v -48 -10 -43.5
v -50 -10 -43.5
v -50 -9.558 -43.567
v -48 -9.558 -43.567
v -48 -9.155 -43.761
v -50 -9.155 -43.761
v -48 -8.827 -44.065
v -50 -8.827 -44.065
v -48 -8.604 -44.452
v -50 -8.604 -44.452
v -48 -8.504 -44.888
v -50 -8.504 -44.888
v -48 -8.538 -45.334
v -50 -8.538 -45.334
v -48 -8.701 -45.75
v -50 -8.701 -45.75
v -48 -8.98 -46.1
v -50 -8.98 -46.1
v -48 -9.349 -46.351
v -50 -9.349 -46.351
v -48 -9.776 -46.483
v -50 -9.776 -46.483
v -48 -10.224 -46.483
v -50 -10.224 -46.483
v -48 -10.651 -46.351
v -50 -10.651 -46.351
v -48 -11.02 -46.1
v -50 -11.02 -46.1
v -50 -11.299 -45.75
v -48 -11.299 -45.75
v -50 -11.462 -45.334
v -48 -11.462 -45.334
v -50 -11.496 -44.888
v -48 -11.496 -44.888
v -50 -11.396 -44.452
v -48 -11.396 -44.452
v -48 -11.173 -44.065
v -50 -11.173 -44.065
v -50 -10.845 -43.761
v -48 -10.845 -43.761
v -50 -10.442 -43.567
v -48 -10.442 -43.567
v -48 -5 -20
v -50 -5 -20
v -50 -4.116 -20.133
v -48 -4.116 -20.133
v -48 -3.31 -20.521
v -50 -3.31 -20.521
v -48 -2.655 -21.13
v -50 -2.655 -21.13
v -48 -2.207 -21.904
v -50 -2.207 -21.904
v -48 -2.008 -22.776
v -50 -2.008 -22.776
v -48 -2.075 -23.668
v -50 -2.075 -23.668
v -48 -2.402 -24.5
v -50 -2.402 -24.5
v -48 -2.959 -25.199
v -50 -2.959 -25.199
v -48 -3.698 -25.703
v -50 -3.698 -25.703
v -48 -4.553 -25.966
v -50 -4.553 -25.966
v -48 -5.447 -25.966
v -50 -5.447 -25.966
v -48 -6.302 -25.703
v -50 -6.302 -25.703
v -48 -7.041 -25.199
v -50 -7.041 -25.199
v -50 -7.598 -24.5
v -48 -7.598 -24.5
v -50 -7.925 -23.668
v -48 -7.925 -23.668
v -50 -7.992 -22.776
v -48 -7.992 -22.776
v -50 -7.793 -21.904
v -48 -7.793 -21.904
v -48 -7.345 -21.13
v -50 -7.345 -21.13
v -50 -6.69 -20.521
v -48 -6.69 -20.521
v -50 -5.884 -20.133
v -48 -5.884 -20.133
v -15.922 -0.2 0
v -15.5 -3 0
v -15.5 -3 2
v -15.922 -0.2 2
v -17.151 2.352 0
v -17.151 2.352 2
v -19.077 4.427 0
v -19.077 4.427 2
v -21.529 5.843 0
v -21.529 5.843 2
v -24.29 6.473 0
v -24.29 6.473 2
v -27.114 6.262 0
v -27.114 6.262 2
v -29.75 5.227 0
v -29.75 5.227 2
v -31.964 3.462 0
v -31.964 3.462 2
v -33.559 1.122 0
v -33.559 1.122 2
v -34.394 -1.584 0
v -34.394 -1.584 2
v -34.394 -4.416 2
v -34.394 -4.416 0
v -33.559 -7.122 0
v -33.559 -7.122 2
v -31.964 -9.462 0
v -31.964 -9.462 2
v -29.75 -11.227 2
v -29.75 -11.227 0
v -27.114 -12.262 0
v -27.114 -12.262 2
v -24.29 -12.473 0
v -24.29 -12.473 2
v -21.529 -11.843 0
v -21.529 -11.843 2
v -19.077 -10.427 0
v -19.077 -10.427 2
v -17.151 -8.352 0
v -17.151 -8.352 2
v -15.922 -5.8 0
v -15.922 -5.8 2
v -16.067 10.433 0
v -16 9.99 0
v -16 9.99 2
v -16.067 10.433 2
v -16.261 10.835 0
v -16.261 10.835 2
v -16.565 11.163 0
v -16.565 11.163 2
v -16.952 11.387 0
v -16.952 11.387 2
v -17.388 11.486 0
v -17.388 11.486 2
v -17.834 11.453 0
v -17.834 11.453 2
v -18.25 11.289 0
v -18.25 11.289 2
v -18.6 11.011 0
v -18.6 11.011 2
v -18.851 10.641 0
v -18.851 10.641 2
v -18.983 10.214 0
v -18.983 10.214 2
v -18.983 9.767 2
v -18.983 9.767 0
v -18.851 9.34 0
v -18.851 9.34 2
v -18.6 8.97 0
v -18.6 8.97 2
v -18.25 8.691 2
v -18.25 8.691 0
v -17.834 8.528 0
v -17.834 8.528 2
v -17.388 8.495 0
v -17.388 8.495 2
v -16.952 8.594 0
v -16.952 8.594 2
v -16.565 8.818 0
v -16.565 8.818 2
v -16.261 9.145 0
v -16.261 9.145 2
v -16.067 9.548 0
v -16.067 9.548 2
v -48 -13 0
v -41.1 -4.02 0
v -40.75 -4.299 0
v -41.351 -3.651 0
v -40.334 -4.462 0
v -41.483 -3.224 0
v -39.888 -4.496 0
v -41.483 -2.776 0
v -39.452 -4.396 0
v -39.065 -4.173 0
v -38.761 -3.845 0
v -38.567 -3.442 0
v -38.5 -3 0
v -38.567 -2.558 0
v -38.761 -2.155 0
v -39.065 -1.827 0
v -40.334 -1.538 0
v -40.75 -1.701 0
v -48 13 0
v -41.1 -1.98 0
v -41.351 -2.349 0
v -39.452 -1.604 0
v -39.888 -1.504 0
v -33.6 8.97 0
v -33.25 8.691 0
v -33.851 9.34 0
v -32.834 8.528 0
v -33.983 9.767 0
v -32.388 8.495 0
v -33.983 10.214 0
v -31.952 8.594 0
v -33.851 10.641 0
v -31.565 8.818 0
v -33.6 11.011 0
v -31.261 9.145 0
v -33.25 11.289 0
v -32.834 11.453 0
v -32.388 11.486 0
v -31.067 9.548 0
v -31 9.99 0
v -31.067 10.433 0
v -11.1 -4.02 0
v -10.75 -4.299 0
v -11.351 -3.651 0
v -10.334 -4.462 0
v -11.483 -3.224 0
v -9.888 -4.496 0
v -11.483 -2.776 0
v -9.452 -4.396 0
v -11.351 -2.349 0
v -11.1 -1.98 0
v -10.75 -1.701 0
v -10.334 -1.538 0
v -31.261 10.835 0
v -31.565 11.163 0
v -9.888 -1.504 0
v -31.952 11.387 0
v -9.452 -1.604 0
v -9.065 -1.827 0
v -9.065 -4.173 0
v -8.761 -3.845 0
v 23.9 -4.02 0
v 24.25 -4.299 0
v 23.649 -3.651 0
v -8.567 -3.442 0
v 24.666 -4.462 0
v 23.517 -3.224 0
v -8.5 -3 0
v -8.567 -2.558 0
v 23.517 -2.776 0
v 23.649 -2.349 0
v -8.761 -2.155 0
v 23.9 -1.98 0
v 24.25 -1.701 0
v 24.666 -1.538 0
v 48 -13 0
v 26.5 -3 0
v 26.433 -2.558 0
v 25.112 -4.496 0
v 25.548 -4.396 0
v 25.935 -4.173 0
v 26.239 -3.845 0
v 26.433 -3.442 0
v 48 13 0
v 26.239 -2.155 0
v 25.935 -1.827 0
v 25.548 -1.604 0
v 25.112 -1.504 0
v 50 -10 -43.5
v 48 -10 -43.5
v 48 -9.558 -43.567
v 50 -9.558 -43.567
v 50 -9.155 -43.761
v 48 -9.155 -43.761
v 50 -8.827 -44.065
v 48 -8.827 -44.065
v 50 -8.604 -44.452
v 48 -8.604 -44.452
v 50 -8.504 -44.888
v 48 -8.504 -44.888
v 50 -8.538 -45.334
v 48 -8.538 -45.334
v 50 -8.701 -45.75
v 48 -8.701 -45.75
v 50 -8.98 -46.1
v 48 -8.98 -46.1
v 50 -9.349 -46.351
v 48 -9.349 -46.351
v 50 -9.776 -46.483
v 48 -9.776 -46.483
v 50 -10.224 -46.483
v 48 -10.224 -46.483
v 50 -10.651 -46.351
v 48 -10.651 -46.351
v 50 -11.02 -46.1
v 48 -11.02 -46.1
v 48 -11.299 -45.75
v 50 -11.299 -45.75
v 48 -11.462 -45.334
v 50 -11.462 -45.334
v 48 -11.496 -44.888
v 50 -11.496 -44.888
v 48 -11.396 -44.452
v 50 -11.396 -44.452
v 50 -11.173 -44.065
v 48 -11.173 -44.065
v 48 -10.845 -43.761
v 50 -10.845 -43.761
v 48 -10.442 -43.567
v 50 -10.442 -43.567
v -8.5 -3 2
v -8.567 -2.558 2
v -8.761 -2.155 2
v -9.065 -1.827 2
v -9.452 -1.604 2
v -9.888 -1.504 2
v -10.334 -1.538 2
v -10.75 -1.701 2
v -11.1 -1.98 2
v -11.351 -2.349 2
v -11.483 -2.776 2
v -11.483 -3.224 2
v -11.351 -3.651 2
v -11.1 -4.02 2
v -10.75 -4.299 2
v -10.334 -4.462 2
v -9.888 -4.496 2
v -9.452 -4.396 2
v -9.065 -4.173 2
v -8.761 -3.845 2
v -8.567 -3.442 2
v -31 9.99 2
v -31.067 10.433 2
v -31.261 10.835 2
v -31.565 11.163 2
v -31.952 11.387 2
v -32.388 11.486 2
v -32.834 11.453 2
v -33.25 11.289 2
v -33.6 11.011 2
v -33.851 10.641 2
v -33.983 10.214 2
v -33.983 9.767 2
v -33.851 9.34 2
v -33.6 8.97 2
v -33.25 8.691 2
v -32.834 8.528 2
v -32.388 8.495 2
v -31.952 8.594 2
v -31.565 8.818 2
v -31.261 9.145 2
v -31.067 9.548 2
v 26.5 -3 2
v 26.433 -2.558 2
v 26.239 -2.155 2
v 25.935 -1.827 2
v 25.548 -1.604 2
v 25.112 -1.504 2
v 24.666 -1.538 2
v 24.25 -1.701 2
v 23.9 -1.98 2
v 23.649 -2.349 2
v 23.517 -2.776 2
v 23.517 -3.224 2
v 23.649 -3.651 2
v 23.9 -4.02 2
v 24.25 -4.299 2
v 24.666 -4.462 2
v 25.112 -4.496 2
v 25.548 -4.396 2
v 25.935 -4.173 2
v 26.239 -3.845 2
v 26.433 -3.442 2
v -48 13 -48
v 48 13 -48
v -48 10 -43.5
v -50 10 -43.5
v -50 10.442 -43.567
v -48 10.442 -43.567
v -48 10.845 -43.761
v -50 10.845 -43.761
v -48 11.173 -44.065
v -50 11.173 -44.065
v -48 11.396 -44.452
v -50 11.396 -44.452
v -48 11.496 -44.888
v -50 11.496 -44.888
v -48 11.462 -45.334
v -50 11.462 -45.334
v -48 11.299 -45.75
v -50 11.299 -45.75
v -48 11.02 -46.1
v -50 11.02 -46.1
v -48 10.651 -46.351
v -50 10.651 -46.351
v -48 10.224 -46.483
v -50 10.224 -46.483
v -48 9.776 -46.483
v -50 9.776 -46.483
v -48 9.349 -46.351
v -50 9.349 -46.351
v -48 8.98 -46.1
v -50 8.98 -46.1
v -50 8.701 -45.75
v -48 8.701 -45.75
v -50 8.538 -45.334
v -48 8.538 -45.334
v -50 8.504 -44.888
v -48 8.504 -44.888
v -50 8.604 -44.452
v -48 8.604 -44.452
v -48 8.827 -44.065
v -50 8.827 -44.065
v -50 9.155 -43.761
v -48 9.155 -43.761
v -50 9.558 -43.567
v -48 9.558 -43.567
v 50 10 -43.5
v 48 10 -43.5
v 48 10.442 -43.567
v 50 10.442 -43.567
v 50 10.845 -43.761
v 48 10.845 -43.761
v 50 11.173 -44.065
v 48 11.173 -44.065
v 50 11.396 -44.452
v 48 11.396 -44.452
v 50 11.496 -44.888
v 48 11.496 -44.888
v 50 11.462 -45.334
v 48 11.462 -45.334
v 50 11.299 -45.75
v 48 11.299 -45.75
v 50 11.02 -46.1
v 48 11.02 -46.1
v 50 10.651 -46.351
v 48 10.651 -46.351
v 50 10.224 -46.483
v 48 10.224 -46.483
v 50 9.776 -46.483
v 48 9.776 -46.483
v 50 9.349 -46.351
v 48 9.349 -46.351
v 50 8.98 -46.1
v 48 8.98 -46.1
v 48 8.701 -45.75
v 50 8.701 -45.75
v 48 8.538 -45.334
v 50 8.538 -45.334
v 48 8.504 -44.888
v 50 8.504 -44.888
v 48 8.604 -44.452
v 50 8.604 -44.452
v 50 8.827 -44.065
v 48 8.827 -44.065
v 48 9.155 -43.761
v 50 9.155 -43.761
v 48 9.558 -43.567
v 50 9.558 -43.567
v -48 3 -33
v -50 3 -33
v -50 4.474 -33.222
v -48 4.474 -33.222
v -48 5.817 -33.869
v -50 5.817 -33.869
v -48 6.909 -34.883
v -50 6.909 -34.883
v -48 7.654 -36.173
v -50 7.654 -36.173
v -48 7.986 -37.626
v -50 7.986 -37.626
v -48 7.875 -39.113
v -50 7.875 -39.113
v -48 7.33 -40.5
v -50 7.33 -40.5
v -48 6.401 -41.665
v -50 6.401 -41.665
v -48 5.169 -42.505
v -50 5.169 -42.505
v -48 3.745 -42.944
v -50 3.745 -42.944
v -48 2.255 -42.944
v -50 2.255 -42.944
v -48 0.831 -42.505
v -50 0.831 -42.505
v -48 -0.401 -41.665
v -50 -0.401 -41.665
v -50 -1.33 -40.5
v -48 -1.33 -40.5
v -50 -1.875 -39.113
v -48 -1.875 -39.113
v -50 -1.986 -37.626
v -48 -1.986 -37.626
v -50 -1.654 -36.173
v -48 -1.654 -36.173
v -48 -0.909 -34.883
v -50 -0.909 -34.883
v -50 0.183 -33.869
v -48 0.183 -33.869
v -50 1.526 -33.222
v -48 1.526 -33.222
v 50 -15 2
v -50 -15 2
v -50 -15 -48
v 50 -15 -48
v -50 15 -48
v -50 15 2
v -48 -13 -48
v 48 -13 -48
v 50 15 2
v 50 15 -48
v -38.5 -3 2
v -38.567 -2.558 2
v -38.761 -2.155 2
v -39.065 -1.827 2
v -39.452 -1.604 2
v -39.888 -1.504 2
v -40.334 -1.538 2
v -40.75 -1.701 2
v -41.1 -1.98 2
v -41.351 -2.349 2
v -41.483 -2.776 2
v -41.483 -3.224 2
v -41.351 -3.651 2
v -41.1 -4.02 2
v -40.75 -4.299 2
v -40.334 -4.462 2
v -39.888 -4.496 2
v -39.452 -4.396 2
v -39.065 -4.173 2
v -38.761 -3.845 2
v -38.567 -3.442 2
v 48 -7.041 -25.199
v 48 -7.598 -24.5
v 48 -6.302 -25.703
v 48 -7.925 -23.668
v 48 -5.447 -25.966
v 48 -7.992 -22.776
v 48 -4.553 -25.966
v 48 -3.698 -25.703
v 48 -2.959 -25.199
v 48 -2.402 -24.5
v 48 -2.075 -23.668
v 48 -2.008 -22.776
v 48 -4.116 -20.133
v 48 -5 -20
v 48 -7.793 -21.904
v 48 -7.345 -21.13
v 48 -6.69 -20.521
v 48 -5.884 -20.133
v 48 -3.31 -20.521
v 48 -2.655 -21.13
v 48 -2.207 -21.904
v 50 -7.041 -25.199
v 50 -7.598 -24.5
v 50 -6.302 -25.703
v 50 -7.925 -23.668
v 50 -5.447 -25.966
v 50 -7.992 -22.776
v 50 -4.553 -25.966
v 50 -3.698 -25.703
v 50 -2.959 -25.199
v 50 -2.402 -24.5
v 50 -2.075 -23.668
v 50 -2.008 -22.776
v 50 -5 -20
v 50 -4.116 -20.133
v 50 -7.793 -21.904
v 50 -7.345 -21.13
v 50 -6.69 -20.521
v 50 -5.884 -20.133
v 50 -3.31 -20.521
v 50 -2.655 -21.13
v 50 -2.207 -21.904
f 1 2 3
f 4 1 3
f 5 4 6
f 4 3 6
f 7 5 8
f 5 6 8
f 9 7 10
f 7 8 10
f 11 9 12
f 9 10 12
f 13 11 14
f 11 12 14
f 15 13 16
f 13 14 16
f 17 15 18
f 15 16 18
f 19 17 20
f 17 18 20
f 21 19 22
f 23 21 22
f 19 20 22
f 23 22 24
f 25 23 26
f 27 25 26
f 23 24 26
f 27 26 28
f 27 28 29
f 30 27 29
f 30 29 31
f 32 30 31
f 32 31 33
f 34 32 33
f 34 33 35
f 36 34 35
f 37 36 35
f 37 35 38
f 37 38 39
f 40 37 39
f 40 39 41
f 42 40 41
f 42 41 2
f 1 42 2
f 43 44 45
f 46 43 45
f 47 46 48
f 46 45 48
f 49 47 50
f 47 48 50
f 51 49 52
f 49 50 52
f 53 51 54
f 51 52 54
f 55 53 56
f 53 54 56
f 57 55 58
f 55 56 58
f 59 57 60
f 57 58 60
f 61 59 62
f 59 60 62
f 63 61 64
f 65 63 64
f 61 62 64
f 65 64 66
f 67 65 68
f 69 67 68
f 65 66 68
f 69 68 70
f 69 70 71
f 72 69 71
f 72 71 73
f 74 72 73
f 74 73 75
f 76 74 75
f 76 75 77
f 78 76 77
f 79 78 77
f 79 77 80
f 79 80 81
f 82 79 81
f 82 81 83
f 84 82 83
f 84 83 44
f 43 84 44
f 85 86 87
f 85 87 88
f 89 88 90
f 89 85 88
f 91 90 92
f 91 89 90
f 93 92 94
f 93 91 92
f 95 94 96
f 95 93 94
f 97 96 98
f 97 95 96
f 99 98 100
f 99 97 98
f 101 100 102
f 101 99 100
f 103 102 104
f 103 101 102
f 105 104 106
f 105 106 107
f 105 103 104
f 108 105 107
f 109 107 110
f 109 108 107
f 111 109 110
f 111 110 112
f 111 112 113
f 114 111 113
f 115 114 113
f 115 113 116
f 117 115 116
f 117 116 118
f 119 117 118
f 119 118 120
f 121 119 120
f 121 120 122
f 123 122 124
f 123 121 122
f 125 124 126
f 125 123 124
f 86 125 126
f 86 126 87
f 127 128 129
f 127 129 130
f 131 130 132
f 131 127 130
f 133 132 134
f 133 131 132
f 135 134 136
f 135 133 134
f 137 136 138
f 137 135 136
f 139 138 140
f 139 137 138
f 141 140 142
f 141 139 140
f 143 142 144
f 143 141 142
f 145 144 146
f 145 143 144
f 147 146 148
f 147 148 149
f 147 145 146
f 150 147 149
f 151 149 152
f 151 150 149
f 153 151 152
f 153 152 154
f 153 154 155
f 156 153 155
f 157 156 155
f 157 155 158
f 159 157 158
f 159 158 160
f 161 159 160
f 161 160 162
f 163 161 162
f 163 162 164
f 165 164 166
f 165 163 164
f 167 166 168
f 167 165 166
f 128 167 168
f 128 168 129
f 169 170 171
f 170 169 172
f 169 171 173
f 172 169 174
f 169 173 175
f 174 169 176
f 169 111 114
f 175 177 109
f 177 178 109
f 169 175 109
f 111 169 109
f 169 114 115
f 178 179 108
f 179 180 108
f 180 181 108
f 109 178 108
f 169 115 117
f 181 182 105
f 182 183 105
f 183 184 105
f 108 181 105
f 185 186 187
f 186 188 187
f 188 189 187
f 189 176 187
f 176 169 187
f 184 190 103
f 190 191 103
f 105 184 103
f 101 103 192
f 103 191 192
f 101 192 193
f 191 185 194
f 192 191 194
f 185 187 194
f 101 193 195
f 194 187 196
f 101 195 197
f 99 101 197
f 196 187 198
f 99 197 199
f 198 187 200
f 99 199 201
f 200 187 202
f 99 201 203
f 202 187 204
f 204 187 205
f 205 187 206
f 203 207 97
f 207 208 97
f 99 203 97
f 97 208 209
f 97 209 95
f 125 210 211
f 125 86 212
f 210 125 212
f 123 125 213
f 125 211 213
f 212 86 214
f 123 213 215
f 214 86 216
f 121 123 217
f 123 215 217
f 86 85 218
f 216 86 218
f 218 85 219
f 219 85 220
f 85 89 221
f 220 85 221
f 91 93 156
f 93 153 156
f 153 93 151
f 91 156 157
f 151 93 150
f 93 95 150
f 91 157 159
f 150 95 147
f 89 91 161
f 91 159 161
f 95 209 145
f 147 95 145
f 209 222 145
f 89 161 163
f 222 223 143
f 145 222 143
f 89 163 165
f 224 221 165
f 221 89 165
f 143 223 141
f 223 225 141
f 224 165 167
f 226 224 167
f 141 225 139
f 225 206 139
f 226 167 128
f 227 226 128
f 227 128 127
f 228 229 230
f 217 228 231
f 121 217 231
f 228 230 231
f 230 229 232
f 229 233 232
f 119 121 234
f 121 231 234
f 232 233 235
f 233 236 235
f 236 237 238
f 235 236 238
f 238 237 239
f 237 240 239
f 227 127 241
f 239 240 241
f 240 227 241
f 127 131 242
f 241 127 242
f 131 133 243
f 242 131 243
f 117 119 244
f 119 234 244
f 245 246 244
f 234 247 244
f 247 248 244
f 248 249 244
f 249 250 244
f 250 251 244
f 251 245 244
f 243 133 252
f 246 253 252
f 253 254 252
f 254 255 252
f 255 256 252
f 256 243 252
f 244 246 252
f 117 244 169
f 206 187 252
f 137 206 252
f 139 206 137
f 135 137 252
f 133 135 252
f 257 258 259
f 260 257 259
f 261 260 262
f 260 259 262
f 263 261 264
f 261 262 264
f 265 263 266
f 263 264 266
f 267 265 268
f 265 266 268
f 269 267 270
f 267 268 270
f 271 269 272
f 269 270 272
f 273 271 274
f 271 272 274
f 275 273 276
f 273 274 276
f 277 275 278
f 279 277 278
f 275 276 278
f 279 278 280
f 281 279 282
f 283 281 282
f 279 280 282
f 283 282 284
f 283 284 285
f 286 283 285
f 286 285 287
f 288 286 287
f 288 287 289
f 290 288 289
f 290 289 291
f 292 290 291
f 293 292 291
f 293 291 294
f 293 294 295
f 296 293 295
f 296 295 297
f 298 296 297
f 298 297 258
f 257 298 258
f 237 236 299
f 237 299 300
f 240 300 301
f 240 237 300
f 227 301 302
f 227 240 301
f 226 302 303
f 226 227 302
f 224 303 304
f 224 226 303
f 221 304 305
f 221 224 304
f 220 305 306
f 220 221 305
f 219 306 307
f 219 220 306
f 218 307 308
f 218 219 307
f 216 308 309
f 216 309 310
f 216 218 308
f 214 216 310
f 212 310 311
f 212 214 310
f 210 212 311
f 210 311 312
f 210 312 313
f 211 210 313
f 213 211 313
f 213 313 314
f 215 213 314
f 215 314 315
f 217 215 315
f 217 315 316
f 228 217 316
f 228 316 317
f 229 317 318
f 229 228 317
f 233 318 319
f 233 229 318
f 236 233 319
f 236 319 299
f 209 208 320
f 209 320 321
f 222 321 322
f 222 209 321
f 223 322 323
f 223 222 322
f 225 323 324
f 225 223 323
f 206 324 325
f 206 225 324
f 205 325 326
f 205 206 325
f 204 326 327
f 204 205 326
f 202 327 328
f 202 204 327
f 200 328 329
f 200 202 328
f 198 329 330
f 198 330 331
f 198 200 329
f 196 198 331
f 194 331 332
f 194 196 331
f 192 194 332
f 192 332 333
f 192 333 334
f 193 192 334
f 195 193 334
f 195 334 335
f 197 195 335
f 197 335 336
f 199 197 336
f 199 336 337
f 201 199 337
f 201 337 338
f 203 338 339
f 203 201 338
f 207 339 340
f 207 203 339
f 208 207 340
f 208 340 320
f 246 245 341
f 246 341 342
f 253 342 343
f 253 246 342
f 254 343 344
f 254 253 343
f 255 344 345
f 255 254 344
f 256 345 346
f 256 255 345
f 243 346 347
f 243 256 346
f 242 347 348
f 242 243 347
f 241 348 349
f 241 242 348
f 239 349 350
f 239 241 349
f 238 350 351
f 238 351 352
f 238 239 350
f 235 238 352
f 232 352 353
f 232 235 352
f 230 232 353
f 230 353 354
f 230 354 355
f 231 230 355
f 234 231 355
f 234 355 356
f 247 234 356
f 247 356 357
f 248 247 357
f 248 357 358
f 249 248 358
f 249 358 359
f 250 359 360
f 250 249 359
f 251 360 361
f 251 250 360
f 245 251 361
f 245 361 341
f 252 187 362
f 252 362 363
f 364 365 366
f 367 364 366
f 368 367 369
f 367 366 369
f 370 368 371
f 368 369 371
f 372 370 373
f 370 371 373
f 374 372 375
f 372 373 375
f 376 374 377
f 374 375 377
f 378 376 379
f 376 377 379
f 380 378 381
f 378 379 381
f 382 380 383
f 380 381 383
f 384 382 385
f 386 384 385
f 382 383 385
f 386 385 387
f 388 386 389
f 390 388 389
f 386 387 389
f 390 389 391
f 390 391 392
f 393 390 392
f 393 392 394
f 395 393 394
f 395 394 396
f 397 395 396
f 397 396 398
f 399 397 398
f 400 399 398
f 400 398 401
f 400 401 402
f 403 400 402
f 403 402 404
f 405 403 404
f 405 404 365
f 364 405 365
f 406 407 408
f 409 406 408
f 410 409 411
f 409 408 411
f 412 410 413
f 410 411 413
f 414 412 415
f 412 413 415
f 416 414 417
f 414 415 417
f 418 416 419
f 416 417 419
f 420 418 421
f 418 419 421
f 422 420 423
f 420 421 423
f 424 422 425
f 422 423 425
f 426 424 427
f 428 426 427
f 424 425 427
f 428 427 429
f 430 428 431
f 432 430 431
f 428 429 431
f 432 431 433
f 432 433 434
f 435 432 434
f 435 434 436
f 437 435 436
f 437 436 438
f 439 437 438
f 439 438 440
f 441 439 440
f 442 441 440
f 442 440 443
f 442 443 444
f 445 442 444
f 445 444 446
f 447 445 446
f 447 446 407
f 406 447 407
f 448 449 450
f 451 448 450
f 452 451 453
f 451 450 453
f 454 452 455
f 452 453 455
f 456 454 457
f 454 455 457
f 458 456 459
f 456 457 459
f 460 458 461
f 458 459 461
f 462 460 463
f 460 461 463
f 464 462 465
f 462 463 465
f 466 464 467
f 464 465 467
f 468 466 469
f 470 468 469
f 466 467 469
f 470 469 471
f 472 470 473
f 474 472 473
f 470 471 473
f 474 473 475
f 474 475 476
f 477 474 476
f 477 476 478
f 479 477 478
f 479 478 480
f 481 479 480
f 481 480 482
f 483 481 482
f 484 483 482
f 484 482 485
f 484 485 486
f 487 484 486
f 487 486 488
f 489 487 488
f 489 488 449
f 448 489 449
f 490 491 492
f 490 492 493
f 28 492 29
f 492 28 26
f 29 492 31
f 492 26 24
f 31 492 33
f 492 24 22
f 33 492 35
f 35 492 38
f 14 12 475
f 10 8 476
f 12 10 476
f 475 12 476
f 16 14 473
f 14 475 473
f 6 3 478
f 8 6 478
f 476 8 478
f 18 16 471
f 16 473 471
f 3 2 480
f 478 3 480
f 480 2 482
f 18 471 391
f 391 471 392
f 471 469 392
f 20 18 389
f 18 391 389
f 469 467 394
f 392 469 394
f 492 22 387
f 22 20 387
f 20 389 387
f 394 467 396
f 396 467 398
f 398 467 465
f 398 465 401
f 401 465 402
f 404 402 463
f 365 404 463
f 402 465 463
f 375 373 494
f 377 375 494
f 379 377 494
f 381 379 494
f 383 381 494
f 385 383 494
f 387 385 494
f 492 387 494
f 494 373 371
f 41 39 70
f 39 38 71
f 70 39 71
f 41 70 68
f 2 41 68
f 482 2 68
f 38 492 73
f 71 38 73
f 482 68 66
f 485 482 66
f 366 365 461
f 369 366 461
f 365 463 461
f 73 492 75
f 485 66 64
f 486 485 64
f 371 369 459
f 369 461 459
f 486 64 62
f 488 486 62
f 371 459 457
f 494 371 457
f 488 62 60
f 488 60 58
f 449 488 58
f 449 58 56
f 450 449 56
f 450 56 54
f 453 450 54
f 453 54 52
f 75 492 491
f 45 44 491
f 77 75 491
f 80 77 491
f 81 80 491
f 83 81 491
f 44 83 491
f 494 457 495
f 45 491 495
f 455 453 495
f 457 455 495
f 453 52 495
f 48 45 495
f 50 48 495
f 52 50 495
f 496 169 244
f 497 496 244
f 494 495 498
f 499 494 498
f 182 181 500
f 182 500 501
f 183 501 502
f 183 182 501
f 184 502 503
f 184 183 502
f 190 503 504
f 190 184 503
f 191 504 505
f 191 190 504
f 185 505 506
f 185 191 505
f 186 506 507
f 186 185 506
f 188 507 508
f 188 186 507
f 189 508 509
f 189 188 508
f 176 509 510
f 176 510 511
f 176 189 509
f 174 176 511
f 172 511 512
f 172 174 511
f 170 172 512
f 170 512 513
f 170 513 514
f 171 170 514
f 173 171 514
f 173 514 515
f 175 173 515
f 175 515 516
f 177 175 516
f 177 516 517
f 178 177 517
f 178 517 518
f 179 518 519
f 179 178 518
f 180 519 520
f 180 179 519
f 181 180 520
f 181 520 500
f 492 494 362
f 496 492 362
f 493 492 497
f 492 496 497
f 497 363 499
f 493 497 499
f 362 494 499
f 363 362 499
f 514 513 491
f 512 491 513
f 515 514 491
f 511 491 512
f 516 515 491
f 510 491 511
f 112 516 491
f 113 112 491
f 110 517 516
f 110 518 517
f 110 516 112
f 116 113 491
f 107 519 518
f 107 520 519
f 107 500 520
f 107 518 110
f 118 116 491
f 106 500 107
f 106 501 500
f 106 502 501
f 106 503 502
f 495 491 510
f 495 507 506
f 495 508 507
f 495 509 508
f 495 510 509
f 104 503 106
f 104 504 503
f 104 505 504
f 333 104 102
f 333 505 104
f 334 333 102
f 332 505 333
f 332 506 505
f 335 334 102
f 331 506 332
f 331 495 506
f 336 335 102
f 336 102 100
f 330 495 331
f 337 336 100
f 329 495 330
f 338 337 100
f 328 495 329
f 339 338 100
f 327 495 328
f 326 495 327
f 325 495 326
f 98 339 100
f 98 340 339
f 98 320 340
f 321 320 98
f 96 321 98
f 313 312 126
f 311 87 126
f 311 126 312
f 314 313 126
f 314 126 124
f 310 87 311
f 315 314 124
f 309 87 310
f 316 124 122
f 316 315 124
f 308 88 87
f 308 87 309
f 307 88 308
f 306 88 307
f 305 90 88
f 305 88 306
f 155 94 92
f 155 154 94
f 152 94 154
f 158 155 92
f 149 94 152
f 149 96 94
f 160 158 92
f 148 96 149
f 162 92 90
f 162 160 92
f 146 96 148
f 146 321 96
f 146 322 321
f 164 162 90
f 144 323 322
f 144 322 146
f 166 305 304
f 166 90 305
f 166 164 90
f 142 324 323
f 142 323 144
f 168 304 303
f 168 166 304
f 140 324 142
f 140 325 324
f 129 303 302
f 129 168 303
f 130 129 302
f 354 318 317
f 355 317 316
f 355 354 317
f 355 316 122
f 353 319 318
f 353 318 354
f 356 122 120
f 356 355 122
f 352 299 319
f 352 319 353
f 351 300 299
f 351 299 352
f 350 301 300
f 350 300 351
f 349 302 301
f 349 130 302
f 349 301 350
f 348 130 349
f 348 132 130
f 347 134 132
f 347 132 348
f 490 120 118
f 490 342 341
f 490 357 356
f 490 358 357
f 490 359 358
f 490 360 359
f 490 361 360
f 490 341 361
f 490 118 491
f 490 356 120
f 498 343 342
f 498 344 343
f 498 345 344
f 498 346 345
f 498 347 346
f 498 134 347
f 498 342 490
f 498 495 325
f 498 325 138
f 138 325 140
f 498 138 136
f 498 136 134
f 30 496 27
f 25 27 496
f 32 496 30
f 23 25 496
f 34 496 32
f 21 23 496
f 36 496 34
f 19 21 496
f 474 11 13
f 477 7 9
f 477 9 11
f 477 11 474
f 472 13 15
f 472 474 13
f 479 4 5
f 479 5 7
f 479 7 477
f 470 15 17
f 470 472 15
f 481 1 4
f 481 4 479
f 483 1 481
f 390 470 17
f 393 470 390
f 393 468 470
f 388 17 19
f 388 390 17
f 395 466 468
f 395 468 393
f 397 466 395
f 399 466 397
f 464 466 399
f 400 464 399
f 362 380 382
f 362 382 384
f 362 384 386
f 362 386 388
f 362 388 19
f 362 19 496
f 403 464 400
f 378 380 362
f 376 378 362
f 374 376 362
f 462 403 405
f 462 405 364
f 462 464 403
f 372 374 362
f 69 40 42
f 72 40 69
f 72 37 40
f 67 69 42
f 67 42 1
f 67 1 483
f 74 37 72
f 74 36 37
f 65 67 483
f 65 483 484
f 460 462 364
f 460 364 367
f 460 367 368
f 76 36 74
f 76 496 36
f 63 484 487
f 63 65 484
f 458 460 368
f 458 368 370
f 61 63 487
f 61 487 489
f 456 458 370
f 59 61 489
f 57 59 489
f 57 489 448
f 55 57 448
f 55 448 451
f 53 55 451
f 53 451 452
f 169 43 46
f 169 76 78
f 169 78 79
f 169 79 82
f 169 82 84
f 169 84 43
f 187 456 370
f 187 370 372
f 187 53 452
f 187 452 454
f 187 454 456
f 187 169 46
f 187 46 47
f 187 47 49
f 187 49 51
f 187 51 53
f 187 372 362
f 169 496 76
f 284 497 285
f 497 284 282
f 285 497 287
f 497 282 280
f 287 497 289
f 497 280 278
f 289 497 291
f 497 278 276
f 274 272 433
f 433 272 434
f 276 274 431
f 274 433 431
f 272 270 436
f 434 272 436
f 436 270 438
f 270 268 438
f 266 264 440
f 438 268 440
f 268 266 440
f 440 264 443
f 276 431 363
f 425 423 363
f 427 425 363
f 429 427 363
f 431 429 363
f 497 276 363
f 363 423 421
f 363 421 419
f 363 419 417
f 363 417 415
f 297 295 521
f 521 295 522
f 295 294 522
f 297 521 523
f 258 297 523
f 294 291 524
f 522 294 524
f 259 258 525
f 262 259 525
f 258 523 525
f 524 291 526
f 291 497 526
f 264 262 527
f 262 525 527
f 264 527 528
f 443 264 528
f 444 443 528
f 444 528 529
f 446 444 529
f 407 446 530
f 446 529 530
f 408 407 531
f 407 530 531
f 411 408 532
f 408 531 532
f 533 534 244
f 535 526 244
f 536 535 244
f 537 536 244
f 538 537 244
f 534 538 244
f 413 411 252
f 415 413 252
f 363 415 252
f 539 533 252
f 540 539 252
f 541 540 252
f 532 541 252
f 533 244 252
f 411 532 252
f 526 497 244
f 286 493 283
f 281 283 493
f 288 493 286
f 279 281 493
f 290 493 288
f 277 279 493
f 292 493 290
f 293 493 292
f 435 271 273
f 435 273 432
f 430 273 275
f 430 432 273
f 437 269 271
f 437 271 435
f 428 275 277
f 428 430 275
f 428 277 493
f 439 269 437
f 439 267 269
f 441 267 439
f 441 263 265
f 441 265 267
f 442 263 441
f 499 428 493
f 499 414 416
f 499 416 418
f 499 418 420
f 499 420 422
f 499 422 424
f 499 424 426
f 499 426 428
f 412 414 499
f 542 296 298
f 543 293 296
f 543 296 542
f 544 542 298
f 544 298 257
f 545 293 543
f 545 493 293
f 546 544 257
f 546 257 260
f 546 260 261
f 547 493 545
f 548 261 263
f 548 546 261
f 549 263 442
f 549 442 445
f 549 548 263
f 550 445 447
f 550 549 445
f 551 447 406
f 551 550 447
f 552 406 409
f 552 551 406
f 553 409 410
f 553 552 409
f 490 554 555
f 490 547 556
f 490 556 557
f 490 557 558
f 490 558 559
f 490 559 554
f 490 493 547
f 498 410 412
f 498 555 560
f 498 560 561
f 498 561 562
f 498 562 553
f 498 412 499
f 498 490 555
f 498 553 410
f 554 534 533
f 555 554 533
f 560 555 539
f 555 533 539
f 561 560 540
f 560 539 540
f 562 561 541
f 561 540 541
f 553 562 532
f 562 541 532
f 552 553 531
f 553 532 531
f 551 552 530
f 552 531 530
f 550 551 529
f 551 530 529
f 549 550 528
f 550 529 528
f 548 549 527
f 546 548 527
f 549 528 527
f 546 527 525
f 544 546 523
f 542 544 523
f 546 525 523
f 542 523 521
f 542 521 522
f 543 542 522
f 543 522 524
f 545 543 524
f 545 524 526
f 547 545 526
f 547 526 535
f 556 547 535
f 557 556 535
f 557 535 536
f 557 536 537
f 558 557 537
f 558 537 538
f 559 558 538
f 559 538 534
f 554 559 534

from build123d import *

# Parameters (mm, degrees)
SKETCH1_W           = 100
SKETCH1_H           = 30
SKETCH1_R           = 9.5
SKETCH1_R_2         = 1.5
BOSS_EXTRUDE1_DEPTH = 2
SKETCH2_W           = 100
SKETCH2_H           = 30
SKETCH2_W_2         = 96
SKETCH2_H_2         = 26
BOSS_EXTRUDE3_DEPTH = 50
CUT_EXTRUDE1_REACH  = 102
SKETCH4_R           = 5
SKETCH5_R           = 1.5
CUT_EXTRUDE2_DEPTH  = 101
SKETCH6_R           = 3
CUT_EXTRUDE3_DEPTH  = 101


with BuildPart() as part:
    # Sketch1 → Boss-Extrude1 (new body)
    with BuildSketch(Plane.XY):
        Rectangle(SKETCH1_W, SKETCH1_H)
        with Locations((-25, -3)):
            Circle(SKETCH1_R, mode=Mode.SUBTRACT)
        with Locations((-40, -3)):
            Circle(SKETCH1_R_2, mode=Mode.SUBTRACT)
        with Locations((-32.5, 9.990381057)):
            Circle(SKETCH1_R_2, mode=Mode.SUBTRACT)
        with Locations((-17.5, 9.990381057)):
            Circle(SKETCH1_R_2, mode=Mode.SUBTRACT)
        with Locations((-10, -3)):
            Circle(SKETCH1_R_2, mode=Mode.SUBTRACT)
        with Locations((25, -3)):
            Circle(SKETCH1_R_2, mode=Mode.SUBTRACT)
    extrude(amount=BOSS_EXTRUDE1_DEPTH)

    # Sketch2 → Boss-Extrude3 (add)
    with BuildSketch(Plane.XY.offset(2)):
        Rectangle(SKETCH2_W, SKETCH2_H)
        Rectangle(SKETCH2_W_2, SKETCH2_H_2, mode=Mode.SUBTRACT)
    extrude(amount=-BOSS_EXTRUDE3_DEPTH)

    # Sketch4 → Cut-Extrude1 (cut, up to next)
    with BuildSketch(Plane.ZY.offset(50), mode=Mode.PRIVATE) as cut_extrude1_sk1:
        with Locations((-38, 3)):
            Circle(SKETCH4_R)
    cut_extrude1_tool1 = extrude(cut_extrude1_sk1.sketch, amount=-CUT_EXTRUDE1_REACH, mode=Mode.PRIVATE) & part.part
    add(cut_extrude1_tool1.solids().sort_by_distance((-50, 3, -38))[0], mode=Mode.SUBTRACT)

    # Sketch5 → Cut-Extrude2 (cut, through all)
    with BuildSketch(Plane.ZY.offset(50)):
        with Locations((-45, 10)):
            Circle(SKETCH5_R)
        with Locations((-45, -10)):
            Circle(SKETCH5_R)
    extrude(amount=-CUT_EXTRUDE2_DEPTH, mode=Mode.SUBTRACT)

    # Sketch6 → Cut-Extrude3 (cut, through all)
    with BuildSketch(Plane.ZY.offset(50)):
        with Locations((-23, -5)):
            Circle(SKETCH6_R)
    extrude(amount=-CUT_EXTRUDE3_DEPTH, mode=Mode.SUBTRACT)


solid = part.part
